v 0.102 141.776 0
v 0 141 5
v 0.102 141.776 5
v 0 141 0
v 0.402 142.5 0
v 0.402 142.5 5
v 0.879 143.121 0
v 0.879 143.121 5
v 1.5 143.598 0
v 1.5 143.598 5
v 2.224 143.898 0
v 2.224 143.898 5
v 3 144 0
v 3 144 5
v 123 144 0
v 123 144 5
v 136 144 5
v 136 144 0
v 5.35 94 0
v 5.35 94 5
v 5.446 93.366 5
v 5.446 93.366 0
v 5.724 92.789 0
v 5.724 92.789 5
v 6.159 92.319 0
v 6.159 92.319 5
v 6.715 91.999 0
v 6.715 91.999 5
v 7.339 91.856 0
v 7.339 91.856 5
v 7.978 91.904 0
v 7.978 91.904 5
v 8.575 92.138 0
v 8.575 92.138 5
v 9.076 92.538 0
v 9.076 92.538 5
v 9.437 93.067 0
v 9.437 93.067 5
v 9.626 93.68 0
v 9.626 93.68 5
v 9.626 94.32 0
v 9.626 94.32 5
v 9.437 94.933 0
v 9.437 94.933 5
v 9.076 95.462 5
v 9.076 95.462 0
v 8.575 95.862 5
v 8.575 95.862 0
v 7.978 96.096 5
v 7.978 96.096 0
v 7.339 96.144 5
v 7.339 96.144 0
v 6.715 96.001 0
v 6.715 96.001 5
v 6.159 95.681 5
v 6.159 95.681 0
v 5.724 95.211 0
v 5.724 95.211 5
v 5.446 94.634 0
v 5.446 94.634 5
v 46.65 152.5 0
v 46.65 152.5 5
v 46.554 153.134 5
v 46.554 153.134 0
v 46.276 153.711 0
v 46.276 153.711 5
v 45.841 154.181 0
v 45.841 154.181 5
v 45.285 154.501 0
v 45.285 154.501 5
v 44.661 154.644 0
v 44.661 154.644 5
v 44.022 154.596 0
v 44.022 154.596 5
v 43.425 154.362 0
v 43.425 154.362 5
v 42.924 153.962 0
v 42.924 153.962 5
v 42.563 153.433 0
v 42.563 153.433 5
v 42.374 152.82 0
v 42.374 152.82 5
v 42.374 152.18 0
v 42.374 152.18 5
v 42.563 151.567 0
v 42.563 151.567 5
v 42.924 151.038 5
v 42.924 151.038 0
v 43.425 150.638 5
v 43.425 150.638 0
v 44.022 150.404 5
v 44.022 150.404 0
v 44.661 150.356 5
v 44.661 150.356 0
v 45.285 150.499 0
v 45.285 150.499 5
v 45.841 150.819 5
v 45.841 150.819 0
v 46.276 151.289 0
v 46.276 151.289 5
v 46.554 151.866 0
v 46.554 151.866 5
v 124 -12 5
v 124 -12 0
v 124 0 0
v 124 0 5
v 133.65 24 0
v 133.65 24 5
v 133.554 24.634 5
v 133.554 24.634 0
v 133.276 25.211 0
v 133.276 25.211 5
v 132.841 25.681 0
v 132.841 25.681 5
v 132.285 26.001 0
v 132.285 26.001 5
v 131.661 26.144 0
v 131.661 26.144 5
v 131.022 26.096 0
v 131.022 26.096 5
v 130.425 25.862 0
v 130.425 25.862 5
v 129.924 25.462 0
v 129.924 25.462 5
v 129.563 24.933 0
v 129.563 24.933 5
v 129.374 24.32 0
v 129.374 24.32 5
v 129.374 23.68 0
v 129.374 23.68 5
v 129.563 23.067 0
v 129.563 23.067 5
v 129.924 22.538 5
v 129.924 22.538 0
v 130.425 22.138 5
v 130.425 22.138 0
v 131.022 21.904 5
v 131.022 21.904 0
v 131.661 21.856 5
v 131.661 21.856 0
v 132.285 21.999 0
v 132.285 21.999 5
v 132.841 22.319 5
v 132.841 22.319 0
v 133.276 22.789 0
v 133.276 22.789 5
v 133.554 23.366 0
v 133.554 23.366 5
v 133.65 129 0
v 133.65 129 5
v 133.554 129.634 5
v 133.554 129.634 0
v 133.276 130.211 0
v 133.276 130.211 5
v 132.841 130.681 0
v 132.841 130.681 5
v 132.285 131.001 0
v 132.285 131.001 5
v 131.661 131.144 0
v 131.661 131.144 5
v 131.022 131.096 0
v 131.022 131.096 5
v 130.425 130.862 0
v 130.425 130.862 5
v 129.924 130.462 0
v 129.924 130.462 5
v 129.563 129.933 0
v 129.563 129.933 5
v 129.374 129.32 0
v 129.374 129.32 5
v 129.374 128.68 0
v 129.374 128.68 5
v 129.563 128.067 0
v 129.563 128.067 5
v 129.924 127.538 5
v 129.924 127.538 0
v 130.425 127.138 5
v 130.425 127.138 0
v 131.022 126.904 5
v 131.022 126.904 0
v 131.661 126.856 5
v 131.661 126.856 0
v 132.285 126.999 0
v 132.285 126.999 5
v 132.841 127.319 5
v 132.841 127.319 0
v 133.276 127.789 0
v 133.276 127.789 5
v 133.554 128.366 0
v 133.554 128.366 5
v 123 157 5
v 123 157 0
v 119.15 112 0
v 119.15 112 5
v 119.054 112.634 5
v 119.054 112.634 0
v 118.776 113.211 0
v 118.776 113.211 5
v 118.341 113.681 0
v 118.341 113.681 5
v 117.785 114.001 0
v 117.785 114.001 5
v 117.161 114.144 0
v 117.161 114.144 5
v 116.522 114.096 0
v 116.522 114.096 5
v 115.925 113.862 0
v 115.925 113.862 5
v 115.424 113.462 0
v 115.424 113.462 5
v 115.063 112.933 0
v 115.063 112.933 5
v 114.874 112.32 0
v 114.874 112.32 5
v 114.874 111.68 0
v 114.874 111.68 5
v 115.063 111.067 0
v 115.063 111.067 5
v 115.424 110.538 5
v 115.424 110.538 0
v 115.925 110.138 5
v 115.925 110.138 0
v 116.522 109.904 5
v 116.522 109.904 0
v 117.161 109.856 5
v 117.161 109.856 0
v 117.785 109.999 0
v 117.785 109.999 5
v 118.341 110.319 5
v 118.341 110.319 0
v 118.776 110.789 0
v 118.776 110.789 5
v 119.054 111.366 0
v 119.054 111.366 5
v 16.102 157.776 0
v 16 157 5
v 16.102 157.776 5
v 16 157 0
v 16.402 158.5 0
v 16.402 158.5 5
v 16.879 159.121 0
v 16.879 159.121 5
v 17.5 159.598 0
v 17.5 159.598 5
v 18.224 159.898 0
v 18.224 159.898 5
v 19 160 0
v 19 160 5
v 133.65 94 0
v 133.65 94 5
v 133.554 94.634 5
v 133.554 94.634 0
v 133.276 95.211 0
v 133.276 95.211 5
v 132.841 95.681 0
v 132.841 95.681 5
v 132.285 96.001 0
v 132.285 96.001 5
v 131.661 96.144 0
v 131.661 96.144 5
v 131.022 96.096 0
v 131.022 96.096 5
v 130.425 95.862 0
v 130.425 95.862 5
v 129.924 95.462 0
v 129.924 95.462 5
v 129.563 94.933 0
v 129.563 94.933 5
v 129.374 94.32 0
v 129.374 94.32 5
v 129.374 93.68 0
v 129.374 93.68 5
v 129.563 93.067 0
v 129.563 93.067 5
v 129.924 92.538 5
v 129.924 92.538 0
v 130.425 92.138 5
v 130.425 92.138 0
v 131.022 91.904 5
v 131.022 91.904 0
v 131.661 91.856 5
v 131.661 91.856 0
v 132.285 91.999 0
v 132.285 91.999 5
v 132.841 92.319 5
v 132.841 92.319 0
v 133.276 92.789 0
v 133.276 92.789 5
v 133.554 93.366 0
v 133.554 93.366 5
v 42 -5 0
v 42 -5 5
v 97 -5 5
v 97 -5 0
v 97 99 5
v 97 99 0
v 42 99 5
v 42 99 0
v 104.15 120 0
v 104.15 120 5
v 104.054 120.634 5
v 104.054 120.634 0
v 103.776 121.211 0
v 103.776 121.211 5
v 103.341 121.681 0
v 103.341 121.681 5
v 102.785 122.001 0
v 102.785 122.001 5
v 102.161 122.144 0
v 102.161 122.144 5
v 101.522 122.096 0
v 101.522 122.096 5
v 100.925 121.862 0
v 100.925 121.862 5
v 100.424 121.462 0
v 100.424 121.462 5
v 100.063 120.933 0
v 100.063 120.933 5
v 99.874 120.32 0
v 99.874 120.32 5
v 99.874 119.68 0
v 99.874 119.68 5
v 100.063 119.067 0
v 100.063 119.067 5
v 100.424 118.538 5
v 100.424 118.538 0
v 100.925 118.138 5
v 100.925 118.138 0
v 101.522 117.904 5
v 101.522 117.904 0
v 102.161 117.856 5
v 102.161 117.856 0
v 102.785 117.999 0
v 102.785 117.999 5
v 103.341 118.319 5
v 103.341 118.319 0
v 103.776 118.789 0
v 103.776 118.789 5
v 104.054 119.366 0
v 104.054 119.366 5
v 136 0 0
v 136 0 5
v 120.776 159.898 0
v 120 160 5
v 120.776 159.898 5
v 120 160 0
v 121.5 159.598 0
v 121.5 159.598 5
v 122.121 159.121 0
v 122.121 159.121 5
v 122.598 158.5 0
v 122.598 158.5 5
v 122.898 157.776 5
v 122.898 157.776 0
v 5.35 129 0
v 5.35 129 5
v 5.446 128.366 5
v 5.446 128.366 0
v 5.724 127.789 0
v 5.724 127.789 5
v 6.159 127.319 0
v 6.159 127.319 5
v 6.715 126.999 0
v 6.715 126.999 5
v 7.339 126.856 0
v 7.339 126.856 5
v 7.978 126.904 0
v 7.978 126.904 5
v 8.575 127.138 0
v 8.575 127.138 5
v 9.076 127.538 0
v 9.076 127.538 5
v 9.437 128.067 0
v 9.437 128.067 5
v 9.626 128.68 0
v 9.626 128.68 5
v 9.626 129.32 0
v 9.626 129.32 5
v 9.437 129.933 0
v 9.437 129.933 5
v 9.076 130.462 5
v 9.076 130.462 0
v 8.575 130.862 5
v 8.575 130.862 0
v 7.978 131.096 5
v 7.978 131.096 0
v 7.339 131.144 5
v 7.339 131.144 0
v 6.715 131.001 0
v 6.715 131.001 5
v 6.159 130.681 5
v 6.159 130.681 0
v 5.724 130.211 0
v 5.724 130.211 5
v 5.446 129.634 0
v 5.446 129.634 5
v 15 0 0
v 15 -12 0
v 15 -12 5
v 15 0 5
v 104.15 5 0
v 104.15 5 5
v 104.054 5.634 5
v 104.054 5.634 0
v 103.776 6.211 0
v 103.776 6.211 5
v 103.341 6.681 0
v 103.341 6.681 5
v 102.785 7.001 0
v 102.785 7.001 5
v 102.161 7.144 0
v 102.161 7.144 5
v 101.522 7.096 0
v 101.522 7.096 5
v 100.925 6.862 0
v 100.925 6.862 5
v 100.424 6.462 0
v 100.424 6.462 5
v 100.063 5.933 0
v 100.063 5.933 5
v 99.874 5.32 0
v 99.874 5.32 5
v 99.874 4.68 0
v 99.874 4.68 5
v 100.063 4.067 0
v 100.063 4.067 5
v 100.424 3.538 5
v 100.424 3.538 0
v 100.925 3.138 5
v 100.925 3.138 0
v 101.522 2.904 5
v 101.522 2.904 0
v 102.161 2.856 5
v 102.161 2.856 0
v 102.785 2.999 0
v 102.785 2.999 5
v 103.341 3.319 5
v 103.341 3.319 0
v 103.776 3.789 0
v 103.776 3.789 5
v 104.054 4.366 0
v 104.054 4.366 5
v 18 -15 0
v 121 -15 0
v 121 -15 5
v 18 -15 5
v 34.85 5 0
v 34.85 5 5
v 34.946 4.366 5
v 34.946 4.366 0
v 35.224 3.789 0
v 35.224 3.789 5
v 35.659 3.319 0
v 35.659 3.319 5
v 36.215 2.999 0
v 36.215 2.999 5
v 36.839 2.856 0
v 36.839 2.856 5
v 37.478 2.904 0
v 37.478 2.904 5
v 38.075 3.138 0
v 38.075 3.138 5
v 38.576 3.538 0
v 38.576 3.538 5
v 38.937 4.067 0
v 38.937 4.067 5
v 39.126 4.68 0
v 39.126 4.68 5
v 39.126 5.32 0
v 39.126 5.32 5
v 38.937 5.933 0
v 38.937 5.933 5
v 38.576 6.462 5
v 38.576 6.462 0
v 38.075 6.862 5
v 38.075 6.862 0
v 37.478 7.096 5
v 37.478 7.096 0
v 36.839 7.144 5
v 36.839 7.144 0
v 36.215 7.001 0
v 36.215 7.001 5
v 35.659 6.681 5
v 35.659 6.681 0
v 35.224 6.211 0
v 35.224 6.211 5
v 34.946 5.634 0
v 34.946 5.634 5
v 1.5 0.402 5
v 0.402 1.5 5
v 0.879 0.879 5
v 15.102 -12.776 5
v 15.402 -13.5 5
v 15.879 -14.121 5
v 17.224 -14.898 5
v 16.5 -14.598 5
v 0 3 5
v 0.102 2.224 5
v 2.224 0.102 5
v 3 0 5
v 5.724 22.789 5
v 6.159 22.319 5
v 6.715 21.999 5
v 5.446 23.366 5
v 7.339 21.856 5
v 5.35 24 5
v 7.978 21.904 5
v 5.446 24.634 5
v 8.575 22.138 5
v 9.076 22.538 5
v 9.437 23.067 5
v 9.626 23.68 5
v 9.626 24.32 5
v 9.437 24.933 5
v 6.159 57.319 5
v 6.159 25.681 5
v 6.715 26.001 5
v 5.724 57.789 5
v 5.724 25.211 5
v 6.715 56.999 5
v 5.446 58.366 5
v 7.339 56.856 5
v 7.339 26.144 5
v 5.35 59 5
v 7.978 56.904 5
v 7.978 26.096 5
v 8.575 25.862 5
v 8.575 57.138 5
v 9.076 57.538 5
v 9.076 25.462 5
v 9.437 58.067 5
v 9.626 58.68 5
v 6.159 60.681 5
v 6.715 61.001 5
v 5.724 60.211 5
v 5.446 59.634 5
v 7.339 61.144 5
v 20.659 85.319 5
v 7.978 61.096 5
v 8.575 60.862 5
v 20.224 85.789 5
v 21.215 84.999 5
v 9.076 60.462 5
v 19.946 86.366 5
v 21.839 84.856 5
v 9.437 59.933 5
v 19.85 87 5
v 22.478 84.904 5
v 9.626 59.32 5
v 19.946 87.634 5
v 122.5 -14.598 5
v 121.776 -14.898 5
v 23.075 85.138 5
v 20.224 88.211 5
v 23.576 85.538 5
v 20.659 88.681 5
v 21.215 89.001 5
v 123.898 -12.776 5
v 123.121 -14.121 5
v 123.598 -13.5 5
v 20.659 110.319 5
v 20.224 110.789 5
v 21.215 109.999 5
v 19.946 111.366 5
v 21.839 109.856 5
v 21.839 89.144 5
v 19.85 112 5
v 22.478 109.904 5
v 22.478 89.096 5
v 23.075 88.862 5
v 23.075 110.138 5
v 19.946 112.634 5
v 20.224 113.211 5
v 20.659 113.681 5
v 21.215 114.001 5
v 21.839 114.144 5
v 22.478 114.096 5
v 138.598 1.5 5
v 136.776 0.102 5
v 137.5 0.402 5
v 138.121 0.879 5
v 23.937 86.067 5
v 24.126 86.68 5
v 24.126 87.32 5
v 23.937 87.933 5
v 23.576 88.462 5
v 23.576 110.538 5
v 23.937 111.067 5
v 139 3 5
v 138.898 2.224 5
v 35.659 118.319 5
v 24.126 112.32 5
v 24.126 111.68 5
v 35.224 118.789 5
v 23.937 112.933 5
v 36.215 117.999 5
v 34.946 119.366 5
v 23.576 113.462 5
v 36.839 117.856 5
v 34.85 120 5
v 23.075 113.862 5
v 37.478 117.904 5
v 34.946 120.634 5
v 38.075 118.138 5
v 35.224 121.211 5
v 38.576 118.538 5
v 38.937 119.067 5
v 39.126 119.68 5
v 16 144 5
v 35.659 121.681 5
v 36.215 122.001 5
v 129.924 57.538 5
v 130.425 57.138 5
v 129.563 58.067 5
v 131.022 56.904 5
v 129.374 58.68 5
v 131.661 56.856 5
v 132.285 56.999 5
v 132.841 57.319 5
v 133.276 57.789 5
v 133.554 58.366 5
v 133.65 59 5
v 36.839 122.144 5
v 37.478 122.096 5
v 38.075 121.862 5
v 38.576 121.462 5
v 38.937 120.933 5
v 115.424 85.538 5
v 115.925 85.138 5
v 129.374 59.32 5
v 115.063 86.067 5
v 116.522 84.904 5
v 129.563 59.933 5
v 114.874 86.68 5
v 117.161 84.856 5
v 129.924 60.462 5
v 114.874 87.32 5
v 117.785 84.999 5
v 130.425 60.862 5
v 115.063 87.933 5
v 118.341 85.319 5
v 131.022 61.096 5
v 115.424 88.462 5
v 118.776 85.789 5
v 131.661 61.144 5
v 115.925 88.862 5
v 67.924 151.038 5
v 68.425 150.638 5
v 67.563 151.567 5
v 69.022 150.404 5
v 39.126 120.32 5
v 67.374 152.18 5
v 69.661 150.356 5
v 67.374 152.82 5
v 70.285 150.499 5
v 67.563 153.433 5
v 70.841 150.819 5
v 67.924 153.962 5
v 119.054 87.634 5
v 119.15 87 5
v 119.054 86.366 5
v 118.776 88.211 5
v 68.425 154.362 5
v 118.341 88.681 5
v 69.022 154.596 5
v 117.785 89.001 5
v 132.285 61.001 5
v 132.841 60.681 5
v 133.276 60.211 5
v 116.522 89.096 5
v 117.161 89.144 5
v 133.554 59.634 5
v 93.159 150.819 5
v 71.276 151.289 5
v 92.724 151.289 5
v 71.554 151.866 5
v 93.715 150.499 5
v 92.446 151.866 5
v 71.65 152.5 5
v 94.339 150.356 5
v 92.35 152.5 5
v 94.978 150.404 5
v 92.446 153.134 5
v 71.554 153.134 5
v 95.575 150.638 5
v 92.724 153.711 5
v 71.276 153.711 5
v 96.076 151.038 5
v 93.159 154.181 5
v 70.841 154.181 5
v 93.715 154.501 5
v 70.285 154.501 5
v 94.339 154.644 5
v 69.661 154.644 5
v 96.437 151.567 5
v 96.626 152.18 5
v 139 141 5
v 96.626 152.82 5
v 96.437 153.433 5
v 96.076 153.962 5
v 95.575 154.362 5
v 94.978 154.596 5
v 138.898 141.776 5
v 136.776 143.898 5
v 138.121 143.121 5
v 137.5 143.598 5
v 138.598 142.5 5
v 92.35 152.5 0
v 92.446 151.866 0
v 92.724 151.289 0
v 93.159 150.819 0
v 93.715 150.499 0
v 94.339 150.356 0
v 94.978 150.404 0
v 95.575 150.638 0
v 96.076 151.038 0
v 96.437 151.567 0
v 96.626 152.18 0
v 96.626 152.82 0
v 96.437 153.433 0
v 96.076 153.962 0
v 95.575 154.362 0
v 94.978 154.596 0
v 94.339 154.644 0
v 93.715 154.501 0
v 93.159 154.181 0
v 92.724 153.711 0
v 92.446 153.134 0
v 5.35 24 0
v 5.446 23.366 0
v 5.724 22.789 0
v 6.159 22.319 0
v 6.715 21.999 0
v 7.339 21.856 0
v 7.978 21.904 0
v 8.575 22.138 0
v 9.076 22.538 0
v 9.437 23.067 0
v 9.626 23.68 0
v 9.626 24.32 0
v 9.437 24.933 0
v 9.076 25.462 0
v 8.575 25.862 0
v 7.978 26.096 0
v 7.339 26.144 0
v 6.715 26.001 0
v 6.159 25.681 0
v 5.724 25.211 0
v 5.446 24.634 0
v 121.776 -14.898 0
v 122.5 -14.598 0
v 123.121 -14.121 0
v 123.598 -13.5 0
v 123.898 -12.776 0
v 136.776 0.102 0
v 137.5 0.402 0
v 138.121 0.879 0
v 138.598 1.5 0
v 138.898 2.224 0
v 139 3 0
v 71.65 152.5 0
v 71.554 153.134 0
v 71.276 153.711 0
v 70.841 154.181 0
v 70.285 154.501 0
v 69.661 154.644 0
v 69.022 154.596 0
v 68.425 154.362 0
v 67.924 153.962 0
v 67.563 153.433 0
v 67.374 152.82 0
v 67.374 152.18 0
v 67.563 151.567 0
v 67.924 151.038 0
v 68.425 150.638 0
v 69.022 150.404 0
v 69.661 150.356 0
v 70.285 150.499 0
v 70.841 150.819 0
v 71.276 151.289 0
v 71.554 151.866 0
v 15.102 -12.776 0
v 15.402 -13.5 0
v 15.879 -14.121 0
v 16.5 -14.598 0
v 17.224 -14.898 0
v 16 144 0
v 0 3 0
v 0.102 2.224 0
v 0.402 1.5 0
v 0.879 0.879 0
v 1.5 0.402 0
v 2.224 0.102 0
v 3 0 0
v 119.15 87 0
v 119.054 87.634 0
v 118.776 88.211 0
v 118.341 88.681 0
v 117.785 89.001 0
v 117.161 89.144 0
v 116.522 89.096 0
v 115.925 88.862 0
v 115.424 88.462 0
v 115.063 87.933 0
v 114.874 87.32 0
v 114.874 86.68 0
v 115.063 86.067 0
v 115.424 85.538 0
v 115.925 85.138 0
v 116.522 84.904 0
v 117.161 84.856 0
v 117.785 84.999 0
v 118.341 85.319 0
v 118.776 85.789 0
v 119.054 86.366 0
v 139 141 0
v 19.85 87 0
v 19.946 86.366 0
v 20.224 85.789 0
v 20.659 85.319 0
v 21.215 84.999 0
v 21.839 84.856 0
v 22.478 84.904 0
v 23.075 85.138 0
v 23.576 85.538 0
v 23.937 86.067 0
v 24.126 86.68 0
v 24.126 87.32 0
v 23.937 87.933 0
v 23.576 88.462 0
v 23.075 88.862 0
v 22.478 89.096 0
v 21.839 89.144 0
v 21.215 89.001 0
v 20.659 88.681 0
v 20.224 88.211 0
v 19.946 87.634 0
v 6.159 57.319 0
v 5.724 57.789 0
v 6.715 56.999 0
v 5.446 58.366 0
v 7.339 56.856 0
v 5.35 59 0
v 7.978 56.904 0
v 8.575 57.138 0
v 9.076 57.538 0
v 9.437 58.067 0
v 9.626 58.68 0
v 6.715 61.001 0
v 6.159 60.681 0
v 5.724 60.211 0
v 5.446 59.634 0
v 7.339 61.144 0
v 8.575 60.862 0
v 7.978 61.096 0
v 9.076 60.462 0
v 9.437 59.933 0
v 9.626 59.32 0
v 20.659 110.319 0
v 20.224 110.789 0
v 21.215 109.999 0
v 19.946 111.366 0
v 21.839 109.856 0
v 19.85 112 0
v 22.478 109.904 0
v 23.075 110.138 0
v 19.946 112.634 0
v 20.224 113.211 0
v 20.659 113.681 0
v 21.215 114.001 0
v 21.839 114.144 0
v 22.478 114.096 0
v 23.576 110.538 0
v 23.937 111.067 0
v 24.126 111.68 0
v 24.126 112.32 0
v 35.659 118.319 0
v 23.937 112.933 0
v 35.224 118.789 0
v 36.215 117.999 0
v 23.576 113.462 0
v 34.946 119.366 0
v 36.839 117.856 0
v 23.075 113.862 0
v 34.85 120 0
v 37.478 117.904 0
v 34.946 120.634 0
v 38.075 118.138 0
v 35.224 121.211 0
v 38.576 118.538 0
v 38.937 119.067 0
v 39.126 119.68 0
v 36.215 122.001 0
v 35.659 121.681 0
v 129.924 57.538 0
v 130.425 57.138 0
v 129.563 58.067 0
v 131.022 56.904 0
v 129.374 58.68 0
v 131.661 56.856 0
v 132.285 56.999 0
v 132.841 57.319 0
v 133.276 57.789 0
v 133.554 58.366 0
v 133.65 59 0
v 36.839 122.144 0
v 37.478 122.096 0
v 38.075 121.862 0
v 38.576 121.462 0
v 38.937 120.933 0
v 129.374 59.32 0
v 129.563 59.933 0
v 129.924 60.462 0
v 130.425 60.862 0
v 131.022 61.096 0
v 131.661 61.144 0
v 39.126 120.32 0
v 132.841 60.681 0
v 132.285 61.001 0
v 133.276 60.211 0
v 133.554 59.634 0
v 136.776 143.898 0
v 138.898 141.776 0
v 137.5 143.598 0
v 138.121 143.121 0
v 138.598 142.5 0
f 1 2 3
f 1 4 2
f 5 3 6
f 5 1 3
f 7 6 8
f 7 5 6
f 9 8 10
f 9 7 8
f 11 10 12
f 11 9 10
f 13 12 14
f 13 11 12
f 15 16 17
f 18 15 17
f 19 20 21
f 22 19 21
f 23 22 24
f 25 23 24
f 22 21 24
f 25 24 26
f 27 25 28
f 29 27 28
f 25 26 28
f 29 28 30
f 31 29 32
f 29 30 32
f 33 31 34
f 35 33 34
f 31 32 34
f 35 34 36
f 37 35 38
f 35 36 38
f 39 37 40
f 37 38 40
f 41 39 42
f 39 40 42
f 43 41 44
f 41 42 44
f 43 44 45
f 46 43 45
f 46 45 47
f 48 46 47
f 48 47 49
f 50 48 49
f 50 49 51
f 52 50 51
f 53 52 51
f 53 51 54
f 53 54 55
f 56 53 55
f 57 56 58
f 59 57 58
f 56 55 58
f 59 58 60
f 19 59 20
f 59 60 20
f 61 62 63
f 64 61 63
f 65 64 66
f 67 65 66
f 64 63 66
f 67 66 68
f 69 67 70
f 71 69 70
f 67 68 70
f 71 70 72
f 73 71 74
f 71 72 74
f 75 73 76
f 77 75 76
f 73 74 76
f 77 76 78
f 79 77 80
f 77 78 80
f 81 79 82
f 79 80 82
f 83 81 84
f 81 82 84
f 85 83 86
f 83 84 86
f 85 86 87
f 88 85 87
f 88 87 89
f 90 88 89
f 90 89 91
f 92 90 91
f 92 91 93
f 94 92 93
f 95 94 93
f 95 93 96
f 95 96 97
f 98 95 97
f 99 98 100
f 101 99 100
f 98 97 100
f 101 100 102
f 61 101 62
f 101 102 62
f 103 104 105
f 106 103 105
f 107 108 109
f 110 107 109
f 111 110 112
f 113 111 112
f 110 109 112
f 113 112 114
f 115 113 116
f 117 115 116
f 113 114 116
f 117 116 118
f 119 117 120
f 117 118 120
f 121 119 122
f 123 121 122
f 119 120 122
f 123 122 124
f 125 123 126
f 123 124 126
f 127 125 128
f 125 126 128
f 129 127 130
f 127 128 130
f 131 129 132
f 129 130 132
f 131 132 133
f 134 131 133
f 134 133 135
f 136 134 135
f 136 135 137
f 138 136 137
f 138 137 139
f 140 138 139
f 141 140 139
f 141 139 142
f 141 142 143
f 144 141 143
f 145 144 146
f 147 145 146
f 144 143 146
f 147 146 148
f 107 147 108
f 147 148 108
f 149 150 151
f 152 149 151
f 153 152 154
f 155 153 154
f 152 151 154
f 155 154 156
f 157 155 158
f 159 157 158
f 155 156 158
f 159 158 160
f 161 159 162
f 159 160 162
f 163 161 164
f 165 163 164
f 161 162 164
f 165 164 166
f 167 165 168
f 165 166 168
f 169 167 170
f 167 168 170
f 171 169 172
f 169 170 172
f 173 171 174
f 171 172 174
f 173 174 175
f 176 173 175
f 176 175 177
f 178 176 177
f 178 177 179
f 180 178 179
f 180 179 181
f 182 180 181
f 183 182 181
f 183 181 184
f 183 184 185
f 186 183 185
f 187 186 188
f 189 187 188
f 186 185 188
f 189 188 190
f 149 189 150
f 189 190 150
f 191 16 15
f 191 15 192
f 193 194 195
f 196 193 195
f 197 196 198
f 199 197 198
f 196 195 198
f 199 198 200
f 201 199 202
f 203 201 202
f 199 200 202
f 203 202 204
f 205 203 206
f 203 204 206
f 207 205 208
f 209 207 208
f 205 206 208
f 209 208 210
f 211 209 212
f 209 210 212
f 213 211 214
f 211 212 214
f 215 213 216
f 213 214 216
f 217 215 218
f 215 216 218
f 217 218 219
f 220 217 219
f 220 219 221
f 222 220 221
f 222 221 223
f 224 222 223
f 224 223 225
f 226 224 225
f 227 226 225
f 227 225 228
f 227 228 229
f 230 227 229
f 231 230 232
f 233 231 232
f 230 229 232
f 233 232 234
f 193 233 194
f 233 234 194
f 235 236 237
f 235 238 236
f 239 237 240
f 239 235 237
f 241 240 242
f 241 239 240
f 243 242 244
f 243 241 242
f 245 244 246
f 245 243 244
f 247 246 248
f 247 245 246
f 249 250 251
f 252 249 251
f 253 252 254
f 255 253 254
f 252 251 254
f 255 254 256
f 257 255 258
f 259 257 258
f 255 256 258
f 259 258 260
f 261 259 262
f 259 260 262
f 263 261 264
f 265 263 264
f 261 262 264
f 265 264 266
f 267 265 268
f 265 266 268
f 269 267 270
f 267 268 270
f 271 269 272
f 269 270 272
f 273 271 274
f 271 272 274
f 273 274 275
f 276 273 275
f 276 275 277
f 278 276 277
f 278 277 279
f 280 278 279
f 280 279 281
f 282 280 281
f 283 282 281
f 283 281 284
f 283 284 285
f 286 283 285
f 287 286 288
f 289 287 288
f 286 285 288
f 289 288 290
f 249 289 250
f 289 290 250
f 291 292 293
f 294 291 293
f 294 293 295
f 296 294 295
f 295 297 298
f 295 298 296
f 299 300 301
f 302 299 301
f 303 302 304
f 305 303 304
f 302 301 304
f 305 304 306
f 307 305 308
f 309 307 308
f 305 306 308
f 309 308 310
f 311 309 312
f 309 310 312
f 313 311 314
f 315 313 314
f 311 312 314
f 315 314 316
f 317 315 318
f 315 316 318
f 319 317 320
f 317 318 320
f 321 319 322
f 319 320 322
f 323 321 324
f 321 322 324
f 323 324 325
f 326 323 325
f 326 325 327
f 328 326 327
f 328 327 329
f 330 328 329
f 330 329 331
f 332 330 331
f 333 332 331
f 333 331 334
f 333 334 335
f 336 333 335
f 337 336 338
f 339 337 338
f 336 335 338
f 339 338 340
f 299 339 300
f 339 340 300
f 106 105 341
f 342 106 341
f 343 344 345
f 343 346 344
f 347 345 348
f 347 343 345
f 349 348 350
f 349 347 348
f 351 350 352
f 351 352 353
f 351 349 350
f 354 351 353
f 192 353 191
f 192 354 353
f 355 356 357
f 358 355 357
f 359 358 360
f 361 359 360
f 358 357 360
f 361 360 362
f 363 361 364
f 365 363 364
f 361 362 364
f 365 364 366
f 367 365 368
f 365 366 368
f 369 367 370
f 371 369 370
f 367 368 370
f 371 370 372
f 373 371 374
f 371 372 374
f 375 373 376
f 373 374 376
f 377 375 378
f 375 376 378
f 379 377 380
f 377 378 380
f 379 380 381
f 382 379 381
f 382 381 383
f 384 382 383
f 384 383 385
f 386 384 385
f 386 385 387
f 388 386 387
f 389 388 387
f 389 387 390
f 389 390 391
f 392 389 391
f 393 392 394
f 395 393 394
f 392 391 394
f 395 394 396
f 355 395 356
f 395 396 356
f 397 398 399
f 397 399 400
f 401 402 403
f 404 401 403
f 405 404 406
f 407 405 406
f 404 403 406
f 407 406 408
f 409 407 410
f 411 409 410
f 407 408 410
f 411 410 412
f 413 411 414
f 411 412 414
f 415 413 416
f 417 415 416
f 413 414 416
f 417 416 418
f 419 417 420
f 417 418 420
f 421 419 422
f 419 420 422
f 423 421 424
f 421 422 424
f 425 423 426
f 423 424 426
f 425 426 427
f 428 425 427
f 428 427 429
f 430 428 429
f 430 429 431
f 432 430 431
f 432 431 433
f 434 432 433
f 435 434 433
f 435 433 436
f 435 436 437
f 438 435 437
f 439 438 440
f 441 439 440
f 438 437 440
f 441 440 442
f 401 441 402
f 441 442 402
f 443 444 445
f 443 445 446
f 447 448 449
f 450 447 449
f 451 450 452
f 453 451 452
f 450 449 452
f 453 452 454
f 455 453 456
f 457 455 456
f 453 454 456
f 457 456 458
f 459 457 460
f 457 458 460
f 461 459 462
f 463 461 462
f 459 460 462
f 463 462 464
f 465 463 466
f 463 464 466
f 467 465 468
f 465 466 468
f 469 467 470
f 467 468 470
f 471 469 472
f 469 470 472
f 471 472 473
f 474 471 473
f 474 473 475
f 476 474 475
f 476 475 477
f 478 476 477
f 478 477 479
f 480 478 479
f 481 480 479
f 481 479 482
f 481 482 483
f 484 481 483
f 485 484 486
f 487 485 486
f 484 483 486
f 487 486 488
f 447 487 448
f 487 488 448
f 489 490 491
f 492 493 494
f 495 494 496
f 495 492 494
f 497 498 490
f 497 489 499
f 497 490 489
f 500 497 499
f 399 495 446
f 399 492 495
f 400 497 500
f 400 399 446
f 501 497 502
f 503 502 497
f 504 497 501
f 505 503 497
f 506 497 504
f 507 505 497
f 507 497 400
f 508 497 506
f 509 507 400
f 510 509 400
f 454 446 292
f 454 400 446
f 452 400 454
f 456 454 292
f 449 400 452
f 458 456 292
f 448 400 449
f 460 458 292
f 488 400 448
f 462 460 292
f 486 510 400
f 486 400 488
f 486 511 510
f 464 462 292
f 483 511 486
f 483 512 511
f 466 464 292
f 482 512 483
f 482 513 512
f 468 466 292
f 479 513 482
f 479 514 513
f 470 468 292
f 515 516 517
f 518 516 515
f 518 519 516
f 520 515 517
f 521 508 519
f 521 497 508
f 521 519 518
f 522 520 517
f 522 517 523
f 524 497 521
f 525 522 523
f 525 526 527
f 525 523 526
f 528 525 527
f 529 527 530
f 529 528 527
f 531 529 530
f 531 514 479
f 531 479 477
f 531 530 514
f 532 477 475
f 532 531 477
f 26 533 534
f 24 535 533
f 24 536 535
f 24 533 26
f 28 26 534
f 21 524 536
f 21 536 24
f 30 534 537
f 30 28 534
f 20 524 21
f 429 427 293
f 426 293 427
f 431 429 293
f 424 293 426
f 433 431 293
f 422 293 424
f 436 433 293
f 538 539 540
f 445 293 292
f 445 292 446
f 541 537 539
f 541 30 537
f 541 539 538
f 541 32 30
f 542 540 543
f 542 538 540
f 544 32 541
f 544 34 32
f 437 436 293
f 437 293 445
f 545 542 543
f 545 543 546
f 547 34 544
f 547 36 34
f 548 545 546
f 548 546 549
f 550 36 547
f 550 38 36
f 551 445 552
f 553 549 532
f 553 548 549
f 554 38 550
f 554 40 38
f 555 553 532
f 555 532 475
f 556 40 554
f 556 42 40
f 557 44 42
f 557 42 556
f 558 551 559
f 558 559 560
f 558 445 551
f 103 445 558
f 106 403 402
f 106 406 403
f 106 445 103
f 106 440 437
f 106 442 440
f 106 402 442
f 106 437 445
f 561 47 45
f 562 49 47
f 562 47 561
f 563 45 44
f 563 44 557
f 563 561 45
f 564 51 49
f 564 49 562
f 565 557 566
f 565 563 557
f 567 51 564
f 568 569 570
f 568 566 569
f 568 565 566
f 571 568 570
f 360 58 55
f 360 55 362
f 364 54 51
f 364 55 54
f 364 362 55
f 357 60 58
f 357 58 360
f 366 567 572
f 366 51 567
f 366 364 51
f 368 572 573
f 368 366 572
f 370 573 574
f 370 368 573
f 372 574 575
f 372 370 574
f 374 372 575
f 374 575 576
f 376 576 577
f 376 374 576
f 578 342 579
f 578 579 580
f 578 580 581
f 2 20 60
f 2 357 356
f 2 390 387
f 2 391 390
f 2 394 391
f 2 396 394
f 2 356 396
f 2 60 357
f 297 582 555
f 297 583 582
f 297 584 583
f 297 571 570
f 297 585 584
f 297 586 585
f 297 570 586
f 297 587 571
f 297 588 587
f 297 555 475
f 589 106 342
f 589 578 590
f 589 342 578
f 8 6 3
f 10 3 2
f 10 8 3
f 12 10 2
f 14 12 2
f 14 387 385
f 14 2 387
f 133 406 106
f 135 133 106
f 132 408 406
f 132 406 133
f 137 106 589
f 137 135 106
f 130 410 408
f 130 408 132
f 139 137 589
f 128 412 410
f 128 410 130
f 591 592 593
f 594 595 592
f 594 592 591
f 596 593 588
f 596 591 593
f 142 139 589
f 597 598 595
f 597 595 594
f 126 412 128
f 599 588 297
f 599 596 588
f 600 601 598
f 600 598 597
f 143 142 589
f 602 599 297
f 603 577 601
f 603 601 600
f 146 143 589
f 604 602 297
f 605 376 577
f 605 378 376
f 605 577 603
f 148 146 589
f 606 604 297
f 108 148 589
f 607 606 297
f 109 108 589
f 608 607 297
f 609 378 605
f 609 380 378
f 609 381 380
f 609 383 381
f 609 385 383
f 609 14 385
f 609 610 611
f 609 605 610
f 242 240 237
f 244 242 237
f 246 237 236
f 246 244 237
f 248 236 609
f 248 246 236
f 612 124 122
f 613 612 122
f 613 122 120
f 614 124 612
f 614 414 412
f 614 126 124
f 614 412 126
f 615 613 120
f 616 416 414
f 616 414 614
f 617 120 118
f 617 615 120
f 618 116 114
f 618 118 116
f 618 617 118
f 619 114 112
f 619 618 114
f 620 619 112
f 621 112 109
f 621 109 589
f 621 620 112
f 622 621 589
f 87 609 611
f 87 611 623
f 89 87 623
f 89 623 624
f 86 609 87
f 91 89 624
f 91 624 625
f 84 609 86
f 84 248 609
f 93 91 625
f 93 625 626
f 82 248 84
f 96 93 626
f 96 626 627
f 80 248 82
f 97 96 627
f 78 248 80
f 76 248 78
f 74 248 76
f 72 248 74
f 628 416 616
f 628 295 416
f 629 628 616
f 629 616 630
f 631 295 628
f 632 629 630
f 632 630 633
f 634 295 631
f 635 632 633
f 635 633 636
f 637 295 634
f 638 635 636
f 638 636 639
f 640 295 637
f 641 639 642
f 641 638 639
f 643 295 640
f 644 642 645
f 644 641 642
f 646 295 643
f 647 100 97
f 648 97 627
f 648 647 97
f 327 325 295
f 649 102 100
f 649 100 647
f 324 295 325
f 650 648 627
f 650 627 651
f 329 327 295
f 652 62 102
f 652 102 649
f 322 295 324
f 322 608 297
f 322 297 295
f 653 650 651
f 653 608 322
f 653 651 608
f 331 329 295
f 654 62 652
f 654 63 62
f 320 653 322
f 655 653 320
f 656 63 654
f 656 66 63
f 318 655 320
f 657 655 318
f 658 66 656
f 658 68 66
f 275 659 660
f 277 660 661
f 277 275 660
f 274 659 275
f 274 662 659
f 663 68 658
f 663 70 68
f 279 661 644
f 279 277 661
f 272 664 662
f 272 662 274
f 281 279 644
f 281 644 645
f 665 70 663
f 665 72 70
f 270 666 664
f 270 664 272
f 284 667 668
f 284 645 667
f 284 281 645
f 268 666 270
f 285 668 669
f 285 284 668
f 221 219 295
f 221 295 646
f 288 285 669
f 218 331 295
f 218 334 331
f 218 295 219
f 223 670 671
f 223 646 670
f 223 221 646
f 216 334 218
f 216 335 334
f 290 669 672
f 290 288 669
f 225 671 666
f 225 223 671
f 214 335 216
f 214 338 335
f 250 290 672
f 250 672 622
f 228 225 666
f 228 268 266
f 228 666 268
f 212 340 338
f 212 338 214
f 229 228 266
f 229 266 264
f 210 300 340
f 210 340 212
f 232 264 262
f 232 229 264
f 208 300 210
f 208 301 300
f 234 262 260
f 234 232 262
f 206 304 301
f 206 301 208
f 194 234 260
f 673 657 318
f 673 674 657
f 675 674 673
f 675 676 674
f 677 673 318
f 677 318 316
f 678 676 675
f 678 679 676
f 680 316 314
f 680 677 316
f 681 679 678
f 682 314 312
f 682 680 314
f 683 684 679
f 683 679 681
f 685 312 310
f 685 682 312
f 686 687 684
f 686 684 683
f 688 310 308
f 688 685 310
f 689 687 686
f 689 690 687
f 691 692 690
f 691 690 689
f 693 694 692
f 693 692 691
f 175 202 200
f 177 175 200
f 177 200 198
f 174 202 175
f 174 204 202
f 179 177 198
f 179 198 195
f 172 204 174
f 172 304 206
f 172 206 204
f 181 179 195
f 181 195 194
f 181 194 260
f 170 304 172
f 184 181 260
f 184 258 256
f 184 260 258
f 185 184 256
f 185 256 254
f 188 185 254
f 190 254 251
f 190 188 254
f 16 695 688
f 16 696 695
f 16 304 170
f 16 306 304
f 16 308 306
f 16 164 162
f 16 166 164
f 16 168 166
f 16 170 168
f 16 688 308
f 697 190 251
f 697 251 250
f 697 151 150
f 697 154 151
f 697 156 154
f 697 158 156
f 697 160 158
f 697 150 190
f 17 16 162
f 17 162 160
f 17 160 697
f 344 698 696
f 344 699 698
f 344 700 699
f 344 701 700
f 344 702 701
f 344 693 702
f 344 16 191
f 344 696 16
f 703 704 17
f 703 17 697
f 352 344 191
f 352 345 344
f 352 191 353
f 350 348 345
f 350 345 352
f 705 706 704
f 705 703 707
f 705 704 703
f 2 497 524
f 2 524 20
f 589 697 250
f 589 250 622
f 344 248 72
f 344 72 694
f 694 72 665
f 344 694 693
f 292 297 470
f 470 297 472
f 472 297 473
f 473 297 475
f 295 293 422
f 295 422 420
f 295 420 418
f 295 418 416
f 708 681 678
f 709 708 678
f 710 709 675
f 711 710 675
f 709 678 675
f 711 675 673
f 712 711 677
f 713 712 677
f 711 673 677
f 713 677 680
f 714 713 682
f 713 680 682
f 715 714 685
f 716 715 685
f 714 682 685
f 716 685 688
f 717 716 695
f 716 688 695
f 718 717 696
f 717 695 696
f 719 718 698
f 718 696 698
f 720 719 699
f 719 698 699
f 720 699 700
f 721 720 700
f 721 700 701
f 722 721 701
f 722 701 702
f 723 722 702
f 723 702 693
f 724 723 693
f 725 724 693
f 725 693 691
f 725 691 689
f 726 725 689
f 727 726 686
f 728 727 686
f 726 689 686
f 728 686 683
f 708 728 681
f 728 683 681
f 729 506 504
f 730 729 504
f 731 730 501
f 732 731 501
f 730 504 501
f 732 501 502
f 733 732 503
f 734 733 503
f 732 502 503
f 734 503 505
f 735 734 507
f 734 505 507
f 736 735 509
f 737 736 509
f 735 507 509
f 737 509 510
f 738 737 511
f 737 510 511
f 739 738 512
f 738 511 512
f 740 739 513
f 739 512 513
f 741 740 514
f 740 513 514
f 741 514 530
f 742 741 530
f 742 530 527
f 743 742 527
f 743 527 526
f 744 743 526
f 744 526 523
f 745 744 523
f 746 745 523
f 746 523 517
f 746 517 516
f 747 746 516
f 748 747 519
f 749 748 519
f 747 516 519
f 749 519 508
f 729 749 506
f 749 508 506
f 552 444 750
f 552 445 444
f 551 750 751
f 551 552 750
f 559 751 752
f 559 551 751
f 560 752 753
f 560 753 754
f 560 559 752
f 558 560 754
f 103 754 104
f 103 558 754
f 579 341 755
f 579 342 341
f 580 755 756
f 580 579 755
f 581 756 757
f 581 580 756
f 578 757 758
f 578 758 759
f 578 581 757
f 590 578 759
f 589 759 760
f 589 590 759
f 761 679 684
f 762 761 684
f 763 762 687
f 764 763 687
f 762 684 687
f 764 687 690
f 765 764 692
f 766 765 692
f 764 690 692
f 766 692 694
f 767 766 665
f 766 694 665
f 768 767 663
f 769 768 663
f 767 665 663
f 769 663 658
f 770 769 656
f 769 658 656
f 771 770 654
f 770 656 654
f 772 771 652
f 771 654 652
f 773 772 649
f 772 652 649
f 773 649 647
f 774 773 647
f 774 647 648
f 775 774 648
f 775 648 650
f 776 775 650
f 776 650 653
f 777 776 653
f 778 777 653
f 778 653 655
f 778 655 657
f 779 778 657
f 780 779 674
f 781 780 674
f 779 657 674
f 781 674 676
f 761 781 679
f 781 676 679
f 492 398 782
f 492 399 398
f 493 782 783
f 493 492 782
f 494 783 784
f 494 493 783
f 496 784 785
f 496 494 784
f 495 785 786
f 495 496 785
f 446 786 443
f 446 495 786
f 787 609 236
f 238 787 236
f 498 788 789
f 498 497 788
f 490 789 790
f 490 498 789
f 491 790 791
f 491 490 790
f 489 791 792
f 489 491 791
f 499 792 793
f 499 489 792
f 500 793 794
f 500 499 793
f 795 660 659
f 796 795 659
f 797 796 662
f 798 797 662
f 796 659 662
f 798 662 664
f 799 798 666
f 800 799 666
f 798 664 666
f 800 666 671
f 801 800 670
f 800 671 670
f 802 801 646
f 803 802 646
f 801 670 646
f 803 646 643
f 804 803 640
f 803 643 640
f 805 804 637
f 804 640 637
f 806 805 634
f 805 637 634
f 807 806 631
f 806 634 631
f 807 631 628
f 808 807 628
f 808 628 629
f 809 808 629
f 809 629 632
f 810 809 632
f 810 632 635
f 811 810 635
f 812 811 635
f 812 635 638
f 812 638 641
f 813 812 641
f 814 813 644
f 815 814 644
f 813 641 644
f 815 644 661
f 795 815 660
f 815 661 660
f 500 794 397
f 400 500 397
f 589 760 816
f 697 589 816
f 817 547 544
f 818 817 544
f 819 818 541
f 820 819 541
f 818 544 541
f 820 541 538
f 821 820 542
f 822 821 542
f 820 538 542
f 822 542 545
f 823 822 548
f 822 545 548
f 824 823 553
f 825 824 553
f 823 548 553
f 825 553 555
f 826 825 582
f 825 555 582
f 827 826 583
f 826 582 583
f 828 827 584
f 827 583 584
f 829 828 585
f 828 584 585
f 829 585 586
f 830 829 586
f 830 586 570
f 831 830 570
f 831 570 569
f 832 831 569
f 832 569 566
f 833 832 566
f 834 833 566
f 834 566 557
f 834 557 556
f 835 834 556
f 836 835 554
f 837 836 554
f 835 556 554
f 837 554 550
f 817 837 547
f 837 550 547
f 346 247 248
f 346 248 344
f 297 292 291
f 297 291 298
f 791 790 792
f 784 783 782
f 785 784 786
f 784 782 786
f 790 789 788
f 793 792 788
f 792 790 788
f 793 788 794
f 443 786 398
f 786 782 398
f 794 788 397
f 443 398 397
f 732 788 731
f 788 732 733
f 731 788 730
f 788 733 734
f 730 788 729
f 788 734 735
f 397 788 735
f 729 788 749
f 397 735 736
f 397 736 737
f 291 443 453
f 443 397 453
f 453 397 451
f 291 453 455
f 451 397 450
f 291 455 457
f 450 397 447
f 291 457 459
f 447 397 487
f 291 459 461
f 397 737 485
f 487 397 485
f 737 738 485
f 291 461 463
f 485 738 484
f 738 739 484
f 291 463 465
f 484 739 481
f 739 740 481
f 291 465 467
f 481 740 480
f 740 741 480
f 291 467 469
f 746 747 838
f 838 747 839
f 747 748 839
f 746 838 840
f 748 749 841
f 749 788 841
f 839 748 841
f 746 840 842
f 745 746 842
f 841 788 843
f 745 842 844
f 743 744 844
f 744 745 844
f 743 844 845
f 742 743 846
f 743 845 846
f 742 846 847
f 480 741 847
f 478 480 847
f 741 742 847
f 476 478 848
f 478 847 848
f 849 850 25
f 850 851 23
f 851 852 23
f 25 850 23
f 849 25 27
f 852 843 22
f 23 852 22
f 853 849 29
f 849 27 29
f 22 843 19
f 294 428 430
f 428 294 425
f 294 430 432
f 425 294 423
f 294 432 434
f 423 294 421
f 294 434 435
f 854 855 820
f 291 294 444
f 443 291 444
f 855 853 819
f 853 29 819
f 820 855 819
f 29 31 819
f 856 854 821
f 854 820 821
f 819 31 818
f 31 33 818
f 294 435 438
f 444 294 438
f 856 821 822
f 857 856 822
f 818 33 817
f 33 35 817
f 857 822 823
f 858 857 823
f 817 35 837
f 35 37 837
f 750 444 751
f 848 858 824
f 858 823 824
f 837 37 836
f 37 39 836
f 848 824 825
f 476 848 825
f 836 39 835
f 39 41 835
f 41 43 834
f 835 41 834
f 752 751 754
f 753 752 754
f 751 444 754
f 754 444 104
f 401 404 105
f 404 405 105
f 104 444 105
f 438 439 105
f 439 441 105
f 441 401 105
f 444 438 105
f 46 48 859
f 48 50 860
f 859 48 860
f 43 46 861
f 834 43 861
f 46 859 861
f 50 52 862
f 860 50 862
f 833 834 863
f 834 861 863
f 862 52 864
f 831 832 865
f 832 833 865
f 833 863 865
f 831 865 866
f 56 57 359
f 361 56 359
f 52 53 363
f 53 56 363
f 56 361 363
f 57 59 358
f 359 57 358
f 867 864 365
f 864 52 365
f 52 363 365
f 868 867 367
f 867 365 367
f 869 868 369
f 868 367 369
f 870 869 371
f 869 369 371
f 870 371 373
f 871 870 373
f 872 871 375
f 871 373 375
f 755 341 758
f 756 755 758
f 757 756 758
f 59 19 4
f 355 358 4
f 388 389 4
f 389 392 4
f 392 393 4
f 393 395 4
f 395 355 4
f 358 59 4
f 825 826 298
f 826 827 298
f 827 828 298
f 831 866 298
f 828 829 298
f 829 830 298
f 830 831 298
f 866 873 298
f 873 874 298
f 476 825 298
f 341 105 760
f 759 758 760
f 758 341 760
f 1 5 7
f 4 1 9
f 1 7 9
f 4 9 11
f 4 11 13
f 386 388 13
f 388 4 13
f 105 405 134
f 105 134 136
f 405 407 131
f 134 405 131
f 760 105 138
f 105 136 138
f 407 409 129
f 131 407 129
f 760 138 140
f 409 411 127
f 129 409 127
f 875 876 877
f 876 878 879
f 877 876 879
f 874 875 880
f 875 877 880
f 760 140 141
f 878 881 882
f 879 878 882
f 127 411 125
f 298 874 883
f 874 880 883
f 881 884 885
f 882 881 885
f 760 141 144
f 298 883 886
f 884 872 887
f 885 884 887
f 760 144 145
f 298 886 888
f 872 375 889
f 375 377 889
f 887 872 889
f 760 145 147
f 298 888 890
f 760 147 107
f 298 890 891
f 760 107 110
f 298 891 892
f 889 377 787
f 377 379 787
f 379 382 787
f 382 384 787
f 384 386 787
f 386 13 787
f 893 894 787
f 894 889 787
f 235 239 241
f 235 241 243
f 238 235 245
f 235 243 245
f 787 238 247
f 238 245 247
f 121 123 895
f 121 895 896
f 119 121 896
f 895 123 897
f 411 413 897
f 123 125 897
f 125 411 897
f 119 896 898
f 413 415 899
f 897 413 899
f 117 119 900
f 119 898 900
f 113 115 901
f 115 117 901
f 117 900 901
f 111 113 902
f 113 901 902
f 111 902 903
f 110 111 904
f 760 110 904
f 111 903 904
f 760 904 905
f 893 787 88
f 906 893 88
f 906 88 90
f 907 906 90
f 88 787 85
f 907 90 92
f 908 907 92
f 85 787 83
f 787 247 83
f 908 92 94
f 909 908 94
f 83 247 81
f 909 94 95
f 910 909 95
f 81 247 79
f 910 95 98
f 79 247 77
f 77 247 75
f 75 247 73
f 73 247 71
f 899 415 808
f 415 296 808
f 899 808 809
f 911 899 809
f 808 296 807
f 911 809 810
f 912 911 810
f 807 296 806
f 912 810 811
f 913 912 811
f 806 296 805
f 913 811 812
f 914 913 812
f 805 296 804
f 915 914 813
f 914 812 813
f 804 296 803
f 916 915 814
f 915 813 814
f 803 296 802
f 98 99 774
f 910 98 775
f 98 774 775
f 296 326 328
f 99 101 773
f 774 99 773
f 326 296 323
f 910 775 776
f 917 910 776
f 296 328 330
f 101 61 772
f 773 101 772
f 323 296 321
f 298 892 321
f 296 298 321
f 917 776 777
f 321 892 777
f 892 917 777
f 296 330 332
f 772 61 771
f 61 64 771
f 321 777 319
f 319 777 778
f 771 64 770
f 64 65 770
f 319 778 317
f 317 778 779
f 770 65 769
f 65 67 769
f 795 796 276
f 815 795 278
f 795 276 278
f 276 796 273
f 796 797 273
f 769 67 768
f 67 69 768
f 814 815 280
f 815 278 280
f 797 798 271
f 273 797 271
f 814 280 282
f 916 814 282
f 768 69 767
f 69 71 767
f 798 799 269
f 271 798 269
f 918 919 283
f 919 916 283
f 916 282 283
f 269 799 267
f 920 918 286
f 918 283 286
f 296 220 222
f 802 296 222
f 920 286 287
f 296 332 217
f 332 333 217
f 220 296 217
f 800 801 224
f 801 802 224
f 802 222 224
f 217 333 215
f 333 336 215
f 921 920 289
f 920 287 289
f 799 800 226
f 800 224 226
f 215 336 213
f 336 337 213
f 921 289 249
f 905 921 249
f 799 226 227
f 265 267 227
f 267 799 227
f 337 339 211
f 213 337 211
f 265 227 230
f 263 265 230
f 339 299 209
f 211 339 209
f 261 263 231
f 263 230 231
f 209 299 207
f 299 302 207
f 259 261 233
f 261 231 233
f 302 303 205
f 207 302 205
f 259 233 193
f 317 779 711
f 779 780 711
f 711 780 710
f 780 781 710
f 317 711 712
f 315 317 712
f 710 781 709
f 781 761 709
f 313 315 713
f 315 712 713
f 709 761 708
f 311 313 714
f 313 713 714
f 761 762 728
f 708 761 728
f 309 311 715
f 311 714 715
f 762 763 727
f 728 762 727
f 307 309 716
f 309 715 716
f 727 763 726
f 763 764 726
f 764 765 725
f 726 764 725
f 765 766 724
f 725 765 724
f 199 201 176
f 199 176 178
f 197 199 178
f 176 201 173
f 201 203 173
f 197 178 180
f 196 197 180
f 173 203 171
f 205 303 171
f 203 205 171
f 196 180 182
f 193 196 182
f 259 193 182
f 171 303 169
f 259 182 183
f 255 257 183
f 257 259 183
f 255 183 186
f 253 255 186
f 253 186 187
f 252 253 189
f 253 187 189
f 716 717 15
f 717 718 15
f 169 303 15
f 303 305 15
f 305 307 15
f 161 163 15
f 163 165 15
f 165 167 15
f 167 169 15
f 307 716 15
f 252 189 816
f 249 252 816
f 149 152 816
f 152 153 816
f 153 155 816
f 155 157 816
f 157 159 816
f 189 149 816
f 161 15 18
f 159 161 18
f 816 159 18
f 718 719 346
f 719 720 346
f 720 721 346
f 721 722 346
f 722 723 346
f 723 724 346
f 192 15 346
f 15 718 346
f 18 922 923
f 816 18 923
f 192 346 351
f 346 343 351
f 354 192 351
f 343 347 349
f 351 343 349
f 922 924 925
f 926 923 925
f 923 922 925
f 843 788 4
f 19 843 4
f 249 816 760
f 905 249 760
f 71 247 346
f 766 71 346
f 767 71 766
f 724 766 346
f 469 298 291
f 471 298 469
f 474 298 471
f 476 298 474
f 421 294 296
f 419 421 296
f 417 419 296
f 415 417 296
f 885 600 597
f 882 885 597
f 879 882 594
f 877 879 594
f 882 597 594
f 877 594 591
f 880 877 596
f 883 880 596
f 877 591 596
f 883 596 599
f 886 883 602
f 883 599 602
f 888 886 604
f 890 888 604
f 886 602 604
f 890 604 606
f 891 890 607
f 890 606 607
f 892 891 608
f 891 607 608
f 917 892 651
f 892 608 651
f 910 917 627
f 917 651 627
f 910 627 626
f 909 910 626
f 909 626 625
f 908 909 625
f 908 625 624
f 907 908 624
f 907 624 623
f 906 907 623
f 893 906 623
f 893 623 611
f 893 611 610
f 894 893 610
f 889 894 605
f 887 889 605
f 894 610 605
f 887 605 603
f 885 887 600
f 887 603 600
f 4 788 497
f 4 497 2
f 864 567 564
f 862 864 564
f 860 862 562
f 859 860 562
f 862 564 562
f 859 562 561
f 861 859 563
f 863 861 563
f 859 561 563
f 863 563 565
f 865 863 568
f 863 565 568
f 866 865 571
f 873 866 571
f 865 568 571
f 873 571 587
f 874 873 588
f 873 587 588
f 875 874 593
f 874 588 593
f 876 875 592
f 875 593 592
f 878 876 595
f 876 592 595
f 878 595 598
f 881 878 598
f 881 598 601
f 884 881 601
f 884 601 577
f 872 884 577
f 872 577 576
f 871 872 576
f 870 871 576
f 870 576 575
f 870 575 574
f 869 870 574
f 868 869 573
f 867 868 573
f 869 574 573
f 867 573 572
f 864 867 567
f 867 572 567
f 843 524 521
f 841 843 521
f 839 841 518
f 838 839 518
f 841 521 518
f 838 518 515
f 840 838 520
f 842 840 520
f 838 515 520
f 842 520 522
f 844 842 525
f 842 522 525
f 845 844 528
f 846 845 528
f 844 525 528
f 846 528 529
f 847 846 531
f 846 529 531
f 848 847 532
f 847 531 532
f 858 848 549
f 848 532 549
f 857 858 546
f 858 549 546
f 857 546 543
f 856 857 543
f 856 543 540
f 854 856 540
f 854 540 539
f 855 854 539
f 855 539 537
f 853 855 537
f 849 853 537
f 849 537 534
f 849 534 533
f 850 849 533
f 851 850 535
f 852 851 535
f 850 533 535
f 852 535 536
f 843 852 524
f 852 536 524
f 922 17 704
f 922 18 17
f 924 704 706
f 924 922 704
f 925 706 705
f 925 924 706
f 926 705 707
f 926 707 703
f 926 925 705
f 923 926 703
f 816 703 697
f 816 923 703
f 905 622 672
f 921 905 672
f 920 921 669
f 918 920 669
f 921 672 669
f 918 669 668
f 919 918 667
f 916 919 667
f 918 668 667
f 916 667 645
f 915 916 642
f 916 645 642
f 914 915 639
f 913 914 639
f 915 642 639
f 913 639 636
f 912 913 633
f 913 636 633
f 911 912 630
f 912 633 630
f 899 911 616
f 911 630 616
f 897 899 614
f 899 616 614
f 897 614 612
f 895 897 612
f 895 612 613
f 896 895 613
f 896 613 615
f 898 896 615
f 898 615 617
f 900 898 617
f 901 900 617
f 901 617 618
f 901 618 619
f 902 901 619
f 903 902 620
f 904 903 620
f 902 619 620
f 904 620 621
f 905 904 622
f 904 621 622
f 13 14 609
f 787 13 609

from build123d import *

# Parameters (mm, degrees)
SKETCH1_W           = 139
SKETCH1_H           = 160
BOSS_EXTRUDE1_DEPTH = 5
SKETCH2_W           = 16
SKETCH2_H           = 16
CUT_EXTRUDE1_DEPTH  = 5
SKETCH3_R           = 2.15
CUT_EXTRUDE2_DEPTH  = 5
SKETCH4_R           = 2.15
CUT_EXTRUDE3_DEPTH  = 5
LPATTERN1_COUNT     = 4
LPATTERN1_PITCH     = 35
SKETCH5_R           = 2.15
CUT_EXTRUDE4_DEPTH  = 5
SKETCH6_W           = 109
SKETCH6_H           = 15
BOSS_EXTRUDE2_DEPTH = 5
SKETCH7_W           = 55
SKETCH7_H           = 104
CUT_EXTRUDE5_DEPTH  = 5
SKETCH8_R           = 2.15
CUT_EXTRUDE6_DEPTH  = 5
FILLET1_R           = 3


with BuildPart() as part:
    # Sketch1 → Boss-Extrude1 (new body)
    with BuildSketch(Plane.XY):
        with Locations((69.5, 80)):
            Rectangle(SKETCH1_W, SKETCH1_H)
    extrude(amount=BOSS_EXTRUDE1_DEPTH)

    # Sketch2 → Cut-Extrude1 (cut)
    with BuildSketch(Plane.XY.offset(5)):
        with Locations((131, 152)):
            Rectangle(SKETCH2_W, SKETCH2_H)
        with Locations((8, 152)):
            Rectangle(SKETCH2_W, SKETCH2_H)
    extrude(amount=-CUT_EXTRUDE1_DEPTH, mode=Mode.SUBTRACT)

    # Sketch3 → Cut-Extrude2 (cut)
    with BuildSketch(Plane.XY.offset(5)):
        with Locations((69.5, 152.5)):
            Circle(SKETCH3_R)
        with Locations((44.5, 152.5)):
            Circle(SKETCH3_R)
        with Locations(Location((94.5, 152.5, 0), (0, 0, 180))):
            Circle(SKETCH3_R)
    extrude(amount=-CUT_EXTRUDE2_DEPTH, mode=Mode.SUBTRACT)

    # Sketch4 → Cut-Extrude3 (cut)
    with BuildSketch(Plane.XY.offset(5)):
        with Locations((131.5, 129)):
            Circle(SKETCH4_R)
        with Locations(Location((7.5, 129, 0), (0, 0, 180))):
            Circle(SKETCH4_R)
    cut_extrude3 = extrude(amount=-CUT_EXTRUDE3_DEPTH, mode=Mode.SUBTRACT)

    # LPattern1: Cut-Extrude3 ×4
    with Locations(*[(0, -i * LPATTERN1_PITCH, 0) for i in range(1, LPATTERN1_COUNT)]):
        add(cut_extrude3, mode=Mode.SUBTRACT)

    # Sketch5 → Cut-Extrude4 (cut)
    with BuildSketch(Plane.XY.offset(5)):
        with Locations((117, 112)):
            Circle(SKETCH5_R)
        with Locations((117, 87)):
            Circle(SKETCH5_R)
        with Locations(Location((22, 87, 0), (0, 0, 180))):
            Circle(SKETCH5_R)
        with Locations(Location((22, 112, 0), (0, 0, 180))):
            Circle(SKETCH5_R)
    extrude(amount=-CUT_EXTRUDE4_DEPTH, mode=Mode.SUBTRACT)

    # Sketch6 → Boss-Extrude2 (add)
    with BuildSketch(Plane(origin=(0, 0, 0), x_dir=(-1, 0, 0), z_dir=(0, 0, -1))):
        with Locations((-69.5, -7.5)):
            Rectangle(SKETCH6_W, SKETCH6_H)
    extrude(amount=-BOSS_EXTRUDE2_DEPTH)

    # Sketch7 → Cut-Extrude5 (cut)
    with BuildSketch(Plane.XY.offset(5)):
        with Locations((69.5, 47)):
            Rectangle(SKETCH7_W, SKETCH7_H)
    extrude(amount=-CUT_EXTRUDE5_DEPTH, mode=Mode.SUBTRACT)

    # Sketch8 → Cut-Extrude6 (cut)
    with BuildSketch(Plane.XY.offset(5)):
        with Locations((102, 5)):
            Circle(SKETCH8_R)
        with Locations((102, 120)):
            Circle(SKETCH8_R)
        with Locations(Location((37, 120, 0), (0, 0, 180))):
            Circle(SKETCH8_R)
        with Locations(Location((37, 5, 0), (0, 0, 180))):
            Circle(SKETCH8_R)
    extrude(amount=-CUT_EXTRUDE6_DEPTH, mode=Mode.SUBTRACT)

    # Fillet1
    fillet1_edges = [part.edges().sort_by_distance(p)[0] for p in [
        (124, -15, 2.5),
        (15, -15, 2.5),
        (139, 144, 2.5),
        (123, 160, 2.5),
        (16, 160, 2.5),
        (0, 144, 2.5),
        (139, 0, 2.5),
        (0, 0, 2.5),
    ]]
    fillet(fillet1_edges, radius=FILLET1_R)


solid = part.part
